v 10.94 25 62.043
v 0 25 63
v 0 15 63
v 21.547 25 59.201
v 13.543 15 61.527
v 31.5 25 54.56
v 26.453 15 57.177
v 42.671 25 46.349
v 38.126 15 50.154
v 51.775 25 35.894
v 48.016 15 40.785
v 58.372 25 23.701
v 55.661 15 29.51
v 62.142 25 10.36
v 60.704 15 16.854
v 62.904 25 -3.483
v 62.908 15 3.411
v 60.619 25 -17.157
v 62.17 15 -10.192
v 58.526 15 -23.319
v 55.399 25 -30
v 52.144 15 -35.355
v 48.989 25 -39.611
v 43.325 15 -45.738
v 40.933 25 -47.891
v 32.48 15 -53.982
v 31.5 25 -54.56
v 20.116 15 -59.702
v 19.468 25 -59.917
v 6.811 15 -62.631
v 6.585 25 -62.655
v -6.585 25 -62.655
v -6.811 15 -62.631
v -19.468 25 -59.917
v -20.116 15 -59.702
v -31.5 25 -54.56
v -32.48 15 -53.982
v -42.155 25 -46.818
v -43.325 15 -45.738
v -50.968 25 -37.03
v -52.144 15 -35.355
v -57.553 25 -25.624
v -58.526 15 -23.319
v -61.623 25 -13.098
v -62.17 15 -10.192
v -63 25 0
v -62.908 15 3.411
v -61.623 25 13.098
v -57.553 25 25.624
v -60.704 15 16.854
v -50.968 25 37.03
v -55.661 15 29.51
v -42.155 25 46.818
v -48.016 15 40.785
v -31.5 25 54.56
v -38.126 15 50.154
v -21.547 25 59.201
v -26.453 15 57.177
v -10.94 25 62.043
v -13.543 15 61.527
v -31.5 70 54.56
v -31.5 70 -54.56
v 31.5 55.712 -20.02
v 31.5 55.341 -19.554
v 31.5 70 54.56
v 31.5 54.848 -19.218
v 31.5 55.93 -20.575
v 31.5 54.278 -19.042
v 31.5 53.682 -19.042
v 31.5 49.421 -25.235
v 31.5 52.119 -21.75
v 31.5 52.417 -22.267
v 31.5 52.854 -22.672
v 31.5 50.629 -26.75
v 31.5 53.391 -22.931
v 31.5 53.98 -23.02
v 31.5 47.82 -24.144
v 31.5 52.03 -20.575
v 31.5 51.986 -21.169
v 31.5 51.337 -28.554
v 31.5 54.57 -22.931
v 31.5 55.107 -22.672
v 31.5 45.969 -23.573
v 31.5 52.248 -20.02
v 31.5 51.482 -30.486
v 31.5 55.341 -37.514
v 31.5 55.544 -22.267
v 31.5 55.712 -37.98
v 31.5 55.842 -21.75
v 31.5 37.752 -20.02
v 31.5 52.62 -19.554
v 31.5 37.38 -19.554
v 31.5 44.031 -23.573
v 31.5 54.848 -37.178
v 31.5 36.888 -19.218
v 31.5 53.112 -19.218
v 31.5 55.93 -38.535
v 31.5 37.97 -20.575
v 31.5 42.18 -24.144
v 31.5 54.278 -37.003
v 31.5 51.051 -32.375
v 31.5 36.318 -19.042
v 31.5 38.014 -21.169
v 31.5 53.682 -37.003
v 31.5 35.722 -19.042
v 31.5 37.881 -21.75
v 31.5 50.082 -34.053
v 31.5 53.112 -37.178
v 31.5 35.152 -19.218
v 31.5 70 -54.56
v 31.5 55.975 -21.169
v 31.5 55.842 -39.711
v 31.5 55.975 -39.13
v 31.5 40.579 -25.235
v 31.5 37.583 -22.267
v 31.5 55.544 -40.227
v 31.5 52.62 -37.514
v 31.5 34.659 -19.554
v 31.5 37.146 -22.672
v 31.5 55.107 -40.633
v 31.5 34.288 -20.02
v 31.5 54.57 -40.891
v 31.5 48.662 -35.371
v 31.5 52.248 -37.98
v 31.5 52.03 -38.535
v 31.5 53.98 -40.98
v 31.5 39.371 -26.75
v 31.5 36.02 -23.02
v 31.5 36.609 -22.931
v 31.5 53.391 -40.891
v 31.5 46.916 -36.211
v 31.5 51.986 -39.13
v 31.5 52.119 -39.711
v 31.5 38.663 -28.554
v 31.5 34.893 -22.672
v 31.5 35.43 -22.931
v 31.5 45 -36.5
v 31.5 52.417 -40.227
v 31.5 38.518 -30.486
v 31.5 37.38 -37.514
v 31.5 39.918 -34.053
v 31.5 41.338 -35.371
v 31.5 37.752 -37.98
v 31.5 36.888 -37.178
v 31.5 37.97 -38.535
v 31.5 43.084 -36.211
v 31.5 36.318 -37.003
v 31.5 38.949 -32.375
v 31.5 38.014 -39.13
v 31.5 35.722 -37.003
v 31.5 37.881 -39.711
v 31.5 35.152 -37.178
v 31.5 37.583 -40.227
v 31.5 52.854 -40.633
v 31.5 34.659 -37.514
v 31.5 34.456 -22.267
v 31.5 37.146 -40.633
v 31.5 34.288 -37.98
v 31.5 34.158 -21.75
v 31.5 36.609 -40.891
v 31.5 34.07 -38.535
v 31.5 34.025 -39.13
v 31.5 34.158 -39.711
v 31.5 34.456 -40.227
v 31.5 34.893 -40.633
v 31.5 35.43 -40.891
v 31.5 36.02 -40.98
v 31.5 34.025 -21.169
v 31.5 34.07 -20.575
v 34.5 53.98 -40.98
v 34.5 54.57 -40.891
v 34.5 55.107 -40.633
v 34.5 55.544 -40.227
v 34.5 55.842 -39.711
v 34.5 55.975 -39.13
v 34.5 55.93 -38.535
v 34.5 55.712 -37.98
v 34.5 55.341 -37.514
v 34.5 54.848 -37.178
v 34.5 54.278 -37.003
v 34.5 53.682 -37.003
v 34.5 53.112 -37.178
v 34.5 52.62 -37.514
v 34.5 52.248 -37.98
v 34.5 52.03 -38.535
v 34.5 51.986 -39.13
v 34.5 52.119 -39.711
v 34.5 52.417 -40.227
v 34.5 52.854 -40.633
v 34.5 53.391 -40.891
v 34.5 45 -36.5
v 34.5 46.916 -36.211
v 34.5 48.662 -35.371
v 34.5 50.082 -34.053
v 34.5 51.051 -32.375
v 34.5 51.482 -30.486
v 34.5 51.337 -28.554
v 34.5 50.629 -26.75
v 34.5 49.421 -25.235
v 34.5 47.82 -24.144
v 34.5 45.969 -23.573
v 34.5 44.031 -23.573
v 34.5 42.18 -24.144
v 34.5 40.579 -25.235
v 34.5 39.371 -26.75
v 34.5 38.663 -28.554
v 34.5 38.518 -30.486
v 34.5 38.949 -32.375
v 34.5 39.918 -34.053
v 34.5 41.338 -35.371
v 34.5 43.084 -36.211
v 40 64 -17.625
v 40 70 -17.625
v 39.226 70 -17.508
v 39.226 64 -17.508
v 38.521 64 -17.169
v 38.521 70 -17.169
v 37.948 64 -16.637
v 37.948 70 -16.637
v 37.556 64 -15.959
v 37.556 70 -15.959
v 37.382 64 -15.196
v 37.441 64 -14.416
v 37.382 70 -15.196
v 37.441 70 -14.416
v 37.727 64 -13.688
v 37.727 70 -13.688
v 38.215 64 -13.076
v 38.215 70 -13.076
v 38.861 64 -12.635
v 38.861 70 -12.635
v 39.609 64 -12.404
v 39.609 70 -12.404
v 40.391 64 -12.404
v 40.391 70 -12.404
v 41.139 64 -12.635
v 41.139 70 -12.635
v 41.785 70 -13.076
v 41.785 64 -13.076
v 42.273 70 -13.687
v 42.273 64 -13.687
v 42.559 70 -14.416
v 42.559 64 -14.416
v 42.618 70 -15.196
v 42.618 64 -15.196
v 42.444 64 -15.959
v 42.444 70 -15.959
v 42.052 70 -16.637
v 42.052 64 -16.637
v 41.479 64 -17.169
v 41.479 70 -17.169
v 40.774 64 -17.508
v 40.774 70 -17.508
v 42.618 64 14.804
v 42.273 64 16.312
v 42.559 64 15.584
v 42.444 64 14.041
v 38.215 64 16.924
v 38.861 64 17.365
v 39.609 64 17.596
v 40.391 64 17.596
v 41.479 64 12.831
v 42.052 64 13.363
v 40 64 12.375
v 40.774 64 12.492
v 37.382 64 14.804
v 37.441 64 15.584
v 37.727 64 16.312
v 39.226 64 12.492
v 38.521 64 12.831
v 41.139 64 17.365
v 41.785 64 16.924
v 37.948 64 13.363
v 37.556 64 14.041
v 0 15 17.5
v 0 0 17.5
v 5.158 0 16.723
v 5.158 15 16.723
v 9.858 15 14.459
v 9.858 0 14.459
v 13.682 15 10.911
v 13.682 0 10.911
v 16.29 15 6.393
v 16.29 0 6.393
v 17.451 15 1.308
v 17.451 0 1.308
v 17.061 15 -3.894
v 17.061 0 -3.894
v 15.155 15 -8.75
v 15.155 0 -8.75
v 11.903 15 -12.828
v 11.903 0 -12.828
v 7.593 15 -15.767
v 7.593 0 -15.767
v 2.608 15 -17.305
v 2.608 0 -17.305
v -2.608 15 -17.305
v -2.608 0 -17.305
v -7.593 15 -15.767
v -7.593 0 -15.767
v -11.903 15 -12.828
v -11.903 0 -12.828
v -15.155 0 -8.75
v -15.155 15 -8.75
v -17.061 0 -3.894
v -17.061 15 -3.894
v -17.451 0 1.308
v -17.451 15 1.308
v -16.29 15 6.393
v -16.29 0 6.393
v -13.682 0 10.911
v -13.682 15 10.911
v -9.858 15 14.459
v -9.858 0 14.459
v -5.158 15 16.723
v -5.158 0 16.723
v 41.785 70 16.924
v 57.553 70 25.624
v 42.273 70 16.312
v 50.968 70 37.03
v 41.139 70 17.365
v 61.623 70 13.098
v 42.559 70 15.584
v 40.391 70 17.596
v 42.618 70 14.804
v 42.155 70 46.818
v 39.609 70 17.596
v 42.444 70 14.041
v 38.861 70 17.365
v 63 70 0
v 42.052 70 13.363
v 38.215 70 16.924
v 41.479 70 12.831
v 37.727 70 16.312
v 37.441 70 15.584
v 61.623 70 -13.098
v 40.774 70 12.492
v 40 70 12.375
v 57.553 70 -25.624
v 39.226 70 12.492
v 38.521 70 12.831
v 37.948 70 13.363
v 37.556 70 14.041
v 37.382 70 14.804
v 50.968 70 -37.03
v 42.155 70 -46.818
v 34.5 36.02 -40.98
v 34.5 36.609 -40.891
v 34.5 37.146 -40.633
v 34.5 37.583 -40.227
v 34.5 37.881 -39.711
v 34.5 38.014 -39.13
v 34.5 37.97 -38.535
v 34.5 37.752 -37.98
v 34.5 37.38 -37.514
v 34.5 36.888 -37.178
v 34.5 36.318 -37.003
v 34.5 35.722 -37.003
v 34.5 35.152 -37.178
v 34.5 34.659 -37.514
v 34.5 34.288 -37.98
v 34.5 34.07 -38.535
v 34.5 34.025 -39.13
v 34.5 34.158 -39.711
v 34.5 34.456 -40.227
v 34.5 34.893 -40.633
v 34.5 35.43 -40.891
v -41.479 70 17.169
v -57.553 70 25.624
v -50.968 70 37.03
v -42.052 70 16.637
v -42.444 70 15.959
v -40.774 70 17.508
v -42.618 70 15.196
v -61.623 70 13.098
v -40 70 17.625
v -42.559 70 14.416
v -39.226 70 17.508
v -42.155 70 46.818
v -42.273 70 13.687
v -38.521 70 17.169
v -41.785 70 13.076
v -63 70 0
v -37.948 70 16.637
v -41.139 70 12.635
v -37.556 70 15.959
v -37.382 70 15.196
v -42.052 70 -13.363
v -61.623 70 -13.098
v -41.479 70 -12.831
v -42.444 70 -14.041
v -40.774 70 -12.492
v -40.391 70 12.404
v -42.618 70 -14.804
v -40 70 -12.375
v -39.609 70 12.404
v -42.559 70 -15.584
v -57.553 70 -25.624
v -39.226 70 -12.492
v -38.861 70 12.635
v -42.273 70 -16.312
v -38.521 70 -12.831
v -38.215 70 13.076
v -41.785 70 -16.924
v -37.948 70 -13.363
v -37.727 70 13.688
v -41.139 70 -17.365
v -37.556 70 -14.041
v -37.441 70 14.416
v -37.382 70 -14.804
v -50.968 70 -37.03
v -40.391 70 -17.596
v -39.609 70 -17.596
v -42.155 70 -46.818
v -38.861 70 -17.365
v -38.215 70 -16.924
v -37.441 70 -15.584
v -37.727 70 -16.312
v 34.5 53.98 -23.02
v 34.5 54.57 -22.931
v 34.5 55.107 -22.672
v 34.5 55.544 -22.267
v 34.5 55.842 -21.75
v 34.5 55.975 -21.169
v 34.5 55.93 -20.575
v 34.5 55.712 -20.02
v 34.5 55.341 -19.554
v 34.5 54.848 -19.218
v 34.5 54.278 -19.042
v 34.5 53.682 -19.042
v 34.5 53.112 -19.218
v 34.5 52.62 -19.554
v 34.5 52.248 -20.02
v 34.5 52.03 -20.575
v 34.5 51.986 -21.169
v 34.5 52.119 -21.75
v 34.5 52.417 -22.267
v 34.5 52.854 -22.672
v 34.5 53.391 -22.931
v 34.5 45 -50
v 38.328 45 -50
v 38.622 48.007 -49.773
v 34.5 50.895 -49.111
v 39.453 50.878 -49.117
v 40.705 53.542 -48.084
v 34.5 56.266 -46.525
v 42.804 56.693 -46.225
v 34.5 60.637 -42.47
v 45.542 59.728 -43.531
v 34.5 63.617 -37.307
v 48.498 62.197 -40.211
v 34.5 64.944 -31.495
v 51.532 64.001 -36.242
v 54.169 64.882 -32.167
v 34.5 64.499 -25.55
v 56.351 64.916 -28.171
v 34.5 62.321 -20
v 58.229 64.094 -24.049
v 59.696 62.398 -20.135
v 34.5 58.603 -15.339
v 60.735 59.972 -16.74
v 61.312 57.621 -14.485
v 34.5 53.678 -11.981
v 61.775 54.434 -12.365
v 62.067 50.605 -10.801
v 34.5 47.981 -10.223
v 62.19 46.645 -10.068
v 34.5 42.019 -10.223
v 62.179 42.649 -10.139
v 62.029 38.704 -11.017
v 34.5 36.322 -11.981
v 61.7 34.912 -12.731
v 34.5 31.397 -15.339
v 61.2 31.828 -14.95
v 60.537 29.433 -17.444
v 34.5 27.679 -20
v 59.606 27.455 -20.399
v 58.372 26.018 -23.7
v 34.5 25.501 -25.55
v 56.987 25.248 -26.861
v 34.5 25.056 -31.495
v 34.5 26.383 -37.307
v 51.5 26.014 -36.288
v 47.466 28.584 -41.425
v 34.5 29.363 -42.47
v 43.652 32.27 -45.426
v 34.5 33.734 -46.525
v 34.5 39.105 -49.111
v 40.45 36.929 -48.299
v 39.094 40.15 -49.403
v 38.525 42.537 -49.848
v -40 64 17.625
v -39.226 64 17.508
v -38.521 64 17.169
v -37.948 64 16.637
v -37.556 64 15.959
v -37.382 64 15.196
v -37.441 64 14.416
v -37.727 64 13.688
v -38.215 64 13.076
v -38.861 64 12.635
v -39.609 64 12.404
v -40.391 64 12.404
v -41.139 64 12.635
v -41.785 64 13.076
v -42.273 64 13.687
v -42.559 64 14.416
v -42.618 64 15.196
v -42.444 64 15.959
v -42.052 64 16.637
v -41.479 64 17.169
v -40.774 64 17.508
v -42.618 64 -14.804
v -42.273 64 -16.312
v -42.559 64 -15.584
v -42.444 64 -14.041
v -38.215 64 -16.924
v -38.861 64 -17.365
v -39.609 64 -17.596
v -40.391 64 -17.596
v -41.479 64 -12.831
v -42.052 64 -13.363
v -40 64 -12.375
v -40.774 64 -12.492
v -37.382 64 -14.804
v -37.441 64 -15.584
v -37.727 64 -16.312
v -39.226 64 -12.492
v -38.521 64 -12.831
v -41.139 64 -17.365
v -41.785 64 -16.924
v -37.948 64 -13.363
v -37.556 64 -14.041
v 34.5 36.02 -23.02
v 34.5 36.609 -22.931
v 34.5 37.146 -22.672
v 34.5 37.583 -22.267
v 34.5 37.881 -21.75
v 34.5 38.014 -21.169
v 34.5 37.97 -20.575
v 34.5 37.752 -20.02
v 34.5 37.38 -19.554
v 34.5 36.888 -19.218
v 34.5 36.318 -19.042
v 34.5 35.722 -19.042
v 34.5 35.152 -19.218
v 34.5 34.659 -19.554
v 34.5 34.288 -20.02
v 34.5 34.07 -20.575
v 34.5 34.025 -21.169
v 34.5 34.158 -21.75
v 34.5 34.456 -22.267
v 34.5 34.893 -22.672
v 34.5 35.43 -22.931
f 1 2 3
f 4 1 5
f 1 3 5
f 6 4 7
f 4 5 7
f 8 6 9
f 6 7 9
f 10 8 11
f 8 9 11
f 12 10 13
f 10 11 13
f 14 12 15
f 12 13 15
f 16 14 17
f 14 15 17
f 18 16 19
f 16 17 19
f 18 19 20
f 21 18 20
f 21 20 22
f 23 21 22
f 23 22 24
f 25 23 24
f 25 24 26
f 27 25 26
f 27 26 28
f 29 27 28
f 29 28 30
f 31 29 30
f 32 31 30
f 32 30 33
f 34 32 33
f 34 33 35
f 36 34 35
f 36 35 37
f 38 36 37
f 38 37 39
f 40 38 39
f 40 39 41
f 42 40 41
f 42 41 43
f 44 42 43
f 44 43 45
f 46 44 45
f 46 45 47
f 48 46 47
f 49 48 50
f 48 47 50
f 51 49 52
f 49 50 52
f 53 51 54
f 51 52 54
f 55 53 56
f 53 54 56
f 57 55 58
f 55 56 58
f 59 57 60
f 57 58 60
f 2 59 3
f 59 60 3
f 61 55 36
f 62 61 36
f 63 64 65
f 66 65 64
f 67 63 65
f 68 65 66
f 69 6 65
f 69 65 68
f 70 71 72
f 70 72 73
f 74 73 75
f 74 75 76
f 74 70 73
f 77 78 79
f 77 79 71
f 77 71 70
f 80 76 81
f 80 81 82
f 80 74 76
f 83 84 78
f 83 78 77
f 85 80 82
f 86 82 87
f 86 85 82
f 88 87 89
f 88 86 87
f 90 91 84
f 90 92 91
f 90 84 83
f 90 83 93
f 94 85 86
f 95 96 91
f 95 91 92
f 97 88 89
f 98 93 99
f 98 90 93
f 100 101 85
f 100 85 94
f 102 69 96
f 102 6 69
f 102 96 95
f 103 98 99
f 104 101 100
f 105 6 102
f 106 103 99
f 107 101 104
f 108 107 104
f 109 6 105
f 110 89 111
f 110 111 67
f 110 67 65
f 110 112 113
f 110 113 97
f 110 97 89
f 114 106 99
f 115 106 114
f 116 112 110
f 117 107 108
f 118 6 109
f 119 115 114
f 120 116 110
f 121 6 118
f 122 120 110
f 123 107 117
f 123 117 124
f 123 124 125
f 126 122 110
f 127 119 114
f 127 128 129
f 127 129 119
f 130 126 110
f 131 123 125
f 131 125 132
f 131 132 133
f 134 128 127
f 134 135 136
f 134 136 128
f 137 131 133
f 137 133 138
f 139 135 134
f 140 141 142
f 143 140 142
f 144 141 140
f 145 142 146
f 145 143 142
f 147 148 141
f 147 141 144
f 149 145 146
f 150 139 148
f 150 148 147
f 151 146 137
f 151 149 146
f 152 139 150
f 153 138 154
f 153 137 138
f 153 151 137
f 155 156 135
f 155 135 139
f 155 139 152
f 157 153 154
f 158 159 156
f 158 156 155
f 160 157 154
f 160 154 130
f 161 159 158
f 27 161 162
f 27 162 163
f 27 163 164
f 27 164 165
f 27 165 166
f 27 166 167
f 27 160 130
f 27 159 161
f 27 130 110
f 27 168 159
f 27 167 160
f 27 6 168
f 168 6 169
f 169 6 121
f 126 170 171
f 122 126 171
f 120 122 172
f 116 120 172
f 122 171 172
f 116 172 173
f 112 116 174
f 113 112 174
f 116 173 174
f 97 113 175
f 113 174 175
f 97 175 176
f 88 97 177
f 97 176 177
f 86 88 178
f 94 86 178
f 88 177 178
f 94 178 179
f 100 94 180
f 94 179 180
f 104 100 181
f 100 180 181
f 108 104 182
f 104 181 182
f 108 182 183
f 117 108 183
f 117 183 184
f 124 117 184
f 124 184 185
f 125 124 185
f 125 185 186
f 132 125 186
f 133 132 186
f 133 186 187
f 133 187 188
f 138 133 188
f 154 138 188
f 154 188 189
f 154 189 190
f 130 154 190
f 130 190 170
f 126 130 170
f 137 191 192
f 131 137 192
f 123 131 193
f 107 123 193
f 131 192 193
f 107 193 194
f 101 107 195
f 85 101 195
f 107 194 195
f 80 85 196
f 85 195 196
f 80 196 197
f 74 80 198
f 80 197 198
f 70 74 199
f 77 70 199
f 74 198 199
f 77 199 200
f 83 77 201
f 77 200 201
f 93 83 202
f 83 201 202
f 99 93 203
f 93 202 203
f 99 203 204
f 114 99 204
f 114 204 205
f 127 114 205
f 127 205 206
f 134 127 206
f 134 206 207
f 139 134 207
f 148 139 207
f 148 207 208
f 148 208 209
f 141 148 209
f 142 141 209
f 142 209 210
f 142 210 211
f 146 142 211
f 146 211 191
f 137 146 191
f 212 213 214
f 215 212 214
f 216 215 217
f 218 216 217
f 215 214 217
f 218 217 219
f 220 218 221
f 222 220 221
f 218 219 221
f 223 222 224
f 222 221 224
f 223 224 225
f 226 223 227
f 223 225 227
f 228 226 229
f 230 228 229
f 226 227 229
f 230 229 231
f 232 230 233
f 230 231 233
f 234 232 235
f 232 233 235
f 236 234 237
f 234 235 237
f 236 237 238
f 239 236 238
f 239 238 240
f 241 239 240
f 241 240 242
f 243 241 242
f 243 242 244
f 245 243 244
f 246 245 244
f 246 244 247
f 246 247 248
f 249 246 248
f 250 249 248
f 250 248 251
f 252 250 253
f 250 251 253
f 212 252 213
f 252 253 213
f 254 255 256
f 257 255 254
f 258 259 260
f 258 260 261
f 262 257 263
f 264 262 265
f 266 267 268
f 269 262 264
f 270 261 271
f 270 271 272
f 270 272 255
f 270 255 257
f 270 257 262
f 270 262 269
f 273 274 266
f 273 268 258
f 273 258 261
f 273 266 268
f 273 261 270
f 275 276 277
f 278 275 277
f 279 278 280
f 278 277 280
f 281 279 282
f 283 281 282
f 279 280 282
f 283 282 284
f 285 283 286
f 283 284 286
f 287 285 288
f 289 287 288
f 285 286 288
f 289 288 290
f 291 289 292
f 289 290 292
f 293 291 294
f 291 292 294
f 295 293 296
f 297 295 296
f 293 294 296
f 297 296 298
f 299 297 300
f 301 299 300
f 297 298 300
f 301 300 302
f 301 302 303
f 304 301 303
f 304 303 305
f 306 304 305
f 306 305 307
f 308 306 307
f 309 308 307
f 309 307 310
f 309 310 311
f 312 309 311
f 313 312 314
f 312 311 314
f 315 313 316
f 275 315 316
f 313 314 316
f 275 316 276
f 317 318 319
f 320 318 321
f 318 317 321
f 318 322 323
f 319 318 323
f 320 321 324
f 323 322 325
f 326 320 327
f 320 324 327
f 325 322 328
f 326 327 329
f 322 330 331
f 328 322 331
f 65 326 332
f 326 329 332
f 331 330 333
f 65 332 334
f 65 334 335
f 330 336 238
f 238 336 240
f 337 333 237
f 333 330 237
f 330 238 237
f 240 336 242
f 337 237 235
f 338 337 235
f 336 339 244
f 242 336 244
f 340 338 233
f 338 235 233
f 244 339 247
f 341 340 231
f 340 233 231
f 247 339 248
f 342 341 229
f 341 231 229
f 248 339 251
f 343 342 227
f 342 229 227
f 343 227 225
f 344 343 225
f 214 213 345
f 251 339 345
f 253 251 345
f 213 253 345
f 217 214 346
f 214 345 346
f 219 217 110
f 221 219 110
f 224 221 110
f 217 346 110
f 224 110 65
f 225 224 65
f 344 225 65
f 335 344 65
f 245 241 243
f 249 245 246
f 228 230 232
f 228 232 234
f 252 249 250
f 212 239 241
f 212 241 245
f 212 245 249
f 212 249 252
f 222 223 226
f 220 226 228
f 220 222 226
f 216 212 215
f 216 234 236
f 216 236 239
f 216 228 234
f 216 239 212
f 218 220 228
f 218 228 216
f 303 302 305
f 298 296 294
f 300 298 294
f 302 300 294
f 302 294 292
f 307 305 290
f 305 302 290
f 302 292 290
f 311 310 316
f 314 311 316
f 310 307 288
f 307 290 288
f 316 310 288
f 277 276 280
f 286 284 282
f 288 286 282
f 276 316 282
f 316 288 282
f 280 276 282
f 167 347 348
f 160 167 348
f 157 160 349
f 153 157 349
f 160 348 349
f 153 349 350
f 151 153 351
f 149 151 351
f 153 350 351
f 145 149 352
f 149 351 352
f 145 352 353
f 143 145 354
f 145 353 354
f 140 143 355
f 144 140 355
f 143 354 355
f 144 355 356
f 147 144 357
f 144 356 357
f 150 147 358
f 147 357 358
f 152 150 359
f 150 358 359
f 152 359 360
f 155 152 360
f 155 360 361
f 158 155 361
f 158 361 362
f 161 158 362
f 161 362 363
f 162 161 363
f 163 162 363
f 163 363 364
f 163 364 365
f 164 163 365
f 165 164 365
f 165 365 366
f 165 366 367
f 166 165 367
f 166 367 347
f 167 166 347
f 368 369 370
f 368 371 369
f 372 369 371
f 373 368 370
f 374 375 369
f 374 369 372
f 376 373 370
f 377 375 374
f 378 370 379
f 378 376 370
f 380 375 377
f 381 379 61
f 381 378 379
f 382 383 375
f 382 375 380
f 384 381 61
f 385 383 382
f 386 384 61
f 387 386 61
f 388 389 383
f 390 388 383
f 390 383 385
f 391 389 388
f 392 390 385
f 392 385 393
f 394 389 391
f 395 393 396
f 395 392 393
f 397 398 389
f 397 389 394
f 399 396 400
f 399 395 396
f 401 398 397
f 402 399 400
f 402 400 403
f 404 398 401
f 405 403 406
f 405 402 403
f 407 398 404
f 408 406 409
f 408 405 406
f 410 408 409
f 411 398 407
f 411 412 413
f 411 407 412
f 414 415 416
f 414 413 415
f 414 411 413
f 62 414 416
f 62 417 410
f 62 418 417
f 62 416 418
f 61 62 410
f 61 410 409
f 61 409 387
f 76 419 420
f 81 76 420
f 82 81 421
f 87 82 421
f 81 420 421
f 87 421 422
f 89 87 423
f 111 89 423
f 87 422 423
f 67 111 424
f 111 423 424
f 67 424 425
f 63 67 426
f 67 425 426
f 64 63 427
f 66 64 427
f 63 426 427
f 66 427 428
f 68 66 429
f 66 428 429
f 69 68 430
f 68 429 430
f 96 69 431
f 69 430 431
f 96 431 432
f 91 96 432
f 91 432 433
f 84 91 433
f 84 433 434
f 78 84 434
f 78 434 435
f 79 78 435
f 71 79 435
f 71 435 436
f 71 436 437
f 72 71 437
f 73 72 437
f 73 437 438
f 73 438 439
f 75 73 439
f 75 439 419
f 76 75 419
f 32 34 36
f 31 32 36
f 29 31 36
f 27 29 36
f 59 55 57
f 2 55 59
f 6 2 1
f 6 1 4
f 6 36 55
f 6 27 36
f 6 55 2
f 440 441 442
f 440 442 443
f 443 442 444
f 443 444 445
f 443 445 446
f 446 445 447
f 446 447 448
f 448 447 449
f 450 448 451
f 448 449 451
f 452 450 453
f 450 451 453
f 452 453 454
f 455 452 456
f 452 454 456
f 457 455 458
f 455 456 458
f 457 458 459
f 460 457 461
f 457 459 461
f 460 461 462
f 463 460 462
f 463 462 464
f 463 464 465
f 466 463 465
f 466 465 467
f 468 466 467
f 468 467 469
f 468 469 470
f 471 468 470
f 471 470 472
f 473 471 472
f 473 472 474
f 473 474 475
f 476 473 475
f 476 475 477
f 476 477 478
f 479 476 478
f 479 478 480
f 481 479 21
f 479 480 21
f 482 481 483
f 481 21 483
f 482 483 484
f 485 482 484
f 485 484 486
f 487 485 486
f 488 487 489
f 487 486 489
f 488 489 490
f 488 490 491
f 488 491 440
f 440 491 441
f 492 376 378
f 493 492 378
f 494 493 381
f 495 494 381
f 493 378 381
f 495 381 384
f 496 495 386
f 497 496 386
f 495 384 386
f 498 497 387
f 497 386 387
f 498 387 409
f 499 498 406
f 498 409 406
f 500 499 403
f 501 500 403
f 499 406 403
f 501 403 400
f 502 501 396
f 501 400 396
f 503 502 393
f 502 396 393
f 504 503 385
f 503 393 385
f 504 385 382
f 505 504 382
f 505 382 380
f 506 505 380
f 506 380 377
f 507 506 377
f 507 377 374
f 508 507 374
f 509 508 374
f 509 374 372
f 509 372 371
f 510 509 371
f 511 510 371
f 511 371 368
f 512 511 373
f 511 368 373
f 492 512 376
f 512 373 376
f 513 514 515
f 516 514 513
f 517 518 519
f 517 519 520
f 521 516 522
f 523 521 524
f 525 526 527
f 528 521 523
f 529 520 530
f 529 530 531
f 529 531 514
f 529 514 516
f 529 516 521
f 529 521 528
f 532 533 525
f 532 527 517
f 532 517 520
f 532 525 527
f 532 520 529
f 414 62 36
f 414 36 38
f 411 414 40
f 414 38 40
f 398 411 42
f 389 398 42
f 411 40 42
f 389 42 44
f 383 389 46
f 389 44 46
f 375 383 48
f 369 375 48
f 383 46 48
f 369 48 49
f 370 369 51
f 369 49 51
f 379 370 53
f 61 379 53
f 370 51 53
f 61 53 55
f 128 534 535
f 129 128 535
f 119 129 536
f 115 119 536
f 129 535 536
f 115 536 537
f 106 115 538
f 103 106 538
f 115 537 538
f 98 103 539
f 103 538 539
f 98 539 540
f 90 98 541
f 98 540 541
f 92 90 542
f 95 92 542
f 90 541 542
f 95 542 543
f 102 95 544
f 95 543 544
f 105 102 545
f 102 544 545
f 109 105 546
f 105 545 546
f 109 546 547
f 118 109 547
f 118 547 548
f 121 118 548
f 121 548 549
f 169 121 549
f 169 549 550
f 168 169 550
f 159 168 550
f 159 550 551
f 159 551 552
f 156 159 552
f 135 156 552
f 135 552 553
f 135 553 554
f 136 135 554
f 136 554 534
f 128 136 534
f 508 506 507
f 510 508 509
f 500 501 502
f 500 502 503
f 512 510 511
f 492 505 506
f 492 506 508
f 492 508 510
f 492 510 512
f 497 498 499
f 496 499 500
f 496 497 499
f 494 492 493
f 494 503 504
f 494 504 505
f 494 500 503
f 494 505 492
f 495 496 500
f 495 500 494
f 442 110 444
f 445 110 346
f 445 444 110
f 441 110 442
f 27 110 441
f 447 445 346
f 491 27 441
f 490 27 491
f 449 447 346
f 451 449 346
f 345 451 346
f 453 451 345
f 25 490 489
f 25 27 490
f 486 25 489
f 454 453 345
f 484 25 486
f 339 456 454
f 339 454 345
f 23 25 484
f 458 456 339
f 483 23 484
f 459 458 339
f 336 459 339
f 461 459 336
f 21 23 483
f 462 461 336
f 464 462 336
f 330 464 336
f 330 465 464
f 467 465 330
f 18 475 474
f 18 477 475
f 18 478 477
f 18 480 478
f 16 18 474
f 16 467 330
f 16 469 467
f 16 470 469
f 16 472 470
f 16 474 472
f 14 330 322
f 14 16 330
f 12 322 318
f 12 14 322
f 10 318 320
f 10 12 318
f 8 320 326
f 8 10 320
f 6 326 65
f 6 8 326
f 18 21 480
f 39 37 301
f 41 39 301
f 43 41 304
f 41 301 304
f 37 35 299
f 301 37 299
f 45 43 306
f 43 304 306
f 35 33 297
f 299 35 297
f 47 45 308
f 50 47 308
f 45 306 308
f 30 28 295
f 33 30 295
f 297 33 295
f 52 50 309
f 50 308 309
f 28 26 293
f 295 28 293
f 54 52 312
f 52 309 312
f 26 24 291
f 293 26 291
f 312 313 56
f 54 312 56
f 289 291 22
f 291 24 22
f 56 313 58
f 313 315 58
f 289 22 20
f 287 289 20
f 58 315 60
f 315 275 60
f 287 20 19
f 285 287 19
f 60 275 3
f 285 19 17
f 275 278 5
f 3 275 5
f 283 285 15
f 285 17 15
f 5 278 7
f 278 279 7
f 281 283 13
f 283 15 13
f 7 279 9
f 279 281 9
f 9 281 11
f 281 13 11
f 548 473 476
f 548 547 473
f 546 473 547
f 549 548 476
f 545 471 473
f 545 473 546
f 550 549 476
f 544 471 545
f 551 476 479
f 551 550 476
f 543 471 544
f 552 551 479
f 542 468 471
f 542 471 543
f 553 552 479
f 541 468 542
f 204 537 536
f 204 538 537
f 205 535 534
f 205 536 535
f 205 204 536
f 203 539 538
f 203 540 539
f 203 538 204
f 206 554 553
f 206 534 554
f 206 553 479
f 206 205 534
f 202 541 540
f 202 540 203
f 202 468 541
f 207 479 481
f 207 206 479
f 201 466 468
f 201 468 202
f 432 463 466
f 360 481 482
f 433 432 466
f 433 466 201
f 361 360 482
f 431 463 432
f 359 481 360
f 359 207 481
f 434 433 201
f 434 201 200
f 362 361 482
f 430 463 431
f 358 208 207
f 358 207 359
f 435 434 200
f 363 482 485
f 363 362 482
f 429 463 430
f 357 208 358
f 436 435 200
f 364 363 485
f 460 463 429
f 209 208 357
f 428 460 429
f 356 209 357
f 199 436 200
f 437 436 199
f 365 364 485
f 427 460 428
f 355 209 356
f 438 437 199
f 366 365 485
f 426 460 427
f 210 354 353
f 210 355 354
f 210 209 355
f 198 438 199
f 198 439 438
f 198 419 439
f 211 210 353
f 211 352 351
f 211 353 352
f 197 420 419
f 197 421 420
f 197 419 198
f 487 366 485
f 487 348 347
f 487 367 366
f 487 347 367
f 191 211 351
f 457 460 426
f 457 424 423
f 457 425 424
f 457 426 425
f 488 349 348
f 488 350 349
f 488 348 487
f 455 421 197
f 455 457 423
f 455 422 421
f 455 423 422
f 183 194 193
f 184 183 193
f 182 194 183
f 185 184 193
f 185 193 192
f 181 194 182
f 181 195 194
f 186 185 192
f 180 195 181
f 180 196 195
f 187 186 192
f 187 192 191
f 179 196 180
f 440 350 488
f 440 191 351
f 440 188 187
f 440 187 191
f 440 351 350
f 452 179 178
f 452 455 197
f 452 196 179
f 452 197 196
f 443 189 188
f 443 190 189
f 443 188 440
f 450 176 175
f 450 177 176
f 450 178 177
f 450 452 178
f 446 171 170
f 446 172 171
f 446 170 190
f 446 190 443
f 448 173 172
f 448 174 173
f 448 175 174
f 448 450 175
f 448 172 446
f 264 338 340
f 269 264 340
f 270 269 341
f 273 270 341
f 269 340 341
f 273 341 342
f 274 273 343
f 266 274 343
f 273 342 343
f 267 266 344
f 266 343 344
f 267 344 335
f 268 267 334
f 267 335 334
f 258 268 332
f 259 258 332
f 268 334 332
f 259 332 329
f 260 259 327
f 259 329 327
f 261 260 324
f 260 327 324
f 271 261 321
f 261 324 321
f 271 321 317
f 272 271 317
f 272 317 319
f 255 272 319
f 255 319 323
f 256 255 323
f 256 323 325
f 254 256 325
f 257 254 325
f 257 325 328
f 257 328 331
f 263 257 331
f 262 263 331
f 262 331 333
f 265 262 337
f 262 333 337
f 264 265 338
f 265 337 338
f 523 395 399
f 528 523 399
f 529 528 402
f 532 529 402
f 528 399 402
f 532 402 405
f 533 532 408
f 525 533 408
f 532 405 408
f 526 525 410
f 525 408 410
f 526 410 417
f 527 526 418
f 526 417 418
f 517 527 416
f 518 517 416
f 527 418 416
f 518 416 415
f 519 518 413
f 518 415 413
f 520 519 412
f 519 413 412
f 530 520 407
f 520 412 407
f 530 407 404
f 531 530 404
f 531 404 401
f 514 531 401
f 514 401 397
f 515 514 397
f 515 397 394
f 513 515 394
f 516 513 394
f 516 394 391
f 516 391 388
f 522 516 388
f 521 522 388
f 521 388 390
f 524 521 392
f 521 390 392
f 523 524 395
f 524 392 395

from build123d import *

# Parameters (mm, degrees)
SKETCH1_R           = 17.5
BOSS_EXTRUDE1_DEPTH = 15
SKETCH2_R           = 63
BOSS_EXTRUDE2_DEPTH = 10
BOSS_EXTRUDE3_DEPTH = 45
SKETCH5_R           = 2.625
CUT_EXTRUDE1_DEPTH  = 6
SKETCH7_R           = 20
CUT_EXTRUDE2_DEPTH  = 28.5
SKETCH9_R           = 2
SKETCH9_R_2         = 6.5
CUT_EXTRUDE3_DEPTH  = 31.5


with BuildPart() as part:
    # Sketch1 → Boss-Extrude1 (new body)
    with BuildSketch(Plane(origin=(0, 0, 0), x_dir=(1, 0, 0), z_dir=(0, 1, 0))):
        with Locations(Location((0, 0, 0), (0, 0, 270))):
            Circle(SKETCH1_R)
    extrude(amount=BOSS_EXTRUDE1_DEPTH)

    # Sketch2 → Boss-Extrude2 (add)
    with BuildSketch(Plane(origin=(0, 15, 0), x_dir=(1, 0, 0), z_dir=(0, 1, 0))):
        with Locations(Location((0, 0, 0), (0, 0, 270))):
            Circle(SKETCH2_R)
    extrude(amount=BOSS_EXTRUDE2_DEPTH)

    # Sketch4 → Boss-Extrude3 (add)
    with BuildSketch(Plane(origin=(0, 25, 0), x_dir=(1, 0, 0), z_dir=(0, 1, 0))):
        with BuildLine():
            Line((-31.5, 44), (-31.5, 54.559600438))
            ThreePointArc((-31.5, 54.559600438), (-63, 0), (-31.5, -54.559600438))
            Line((-31.5, -54.559600438), (-31.5, -44))
            Line((-31.5, -44), (-31.5, 44))
        make_face()
        with BuildLine():
            Line((31.5, -44), (31.5, 44))
            Line((31.5, 44), (31.5, 54.559600438))
            ThreePointArc((31.5, 54.559600438), (63, 0), (31.5, -54.559600438))
            Line((31.5, -54.559600438), (31.5, -44))
        make_face()
    extrude(amount=BOSS_EXTRUDE3_DEPTH)

    # Sketch5 → Cut-Extrude1 (cut)
    with BuildSketch(Plane(origin=(0, 70, 0), x_dir=(1, 0, 0), z_dir=(0, 1, 0))):
        with Locations(Location((-40, 15, 0), (0, 0, 270))):
            Circle(SKETCH5_R)
        with Locations(Location((-40, -15, 0), (0, 0, 270))):
            Circle(SKETCH5_R)
        with Locations(Location((40, -15, 0), (0, 0, 90))):
            Circle(SKETCH5_R)
        with Locations(Location((40, 15, 0), (0, 0, 90))):
            Circle(SKETCH5_R)
    extrude(amount=-CUT_EXTRUDE1_DEPTH, mode=Mode.SUBTRACT)

    # Sketch7 → Cut-Extrude2 (cut)
    with BuildSketch(Plane(origin=(63, 0, 0), x_dir=(0, 0, -1), z_dir=(1, 0, 0))):
        with Locations((30, 45)):
            Circle(SKETCH7_R)
    extrude(amount=-CUT_EXTRUDE2_DEPTH, mode=Mode.SUBTRACT)

    # Sketch9 → Cut-Extrude3 (cut)
    with BuildSketch(Plane(origin=(63, 0, 0), x_dir=(0, 0, -1), z_dir=(1, 0, 0))):
        with Locations((21.019743879, 36.019743879)):
            Circle(SKETCH9_R)
        with Locations((21.019743879, 53.980256121)):
            Circle(SKETCH9_R)
        with Locations((38.980256121, 53.980256121)):
            Circle(SKETCH9_R)
        with Locations((38.980256121, 36.019743879)):
            Circle(SKETCH9_R)
        with Locations((30, 45)):
            Circle(SKETCH9_R_2)
    extrude(amount=-CUT_EXTRUDE3_DEPTH, mode=Mode.SUBTRACT)


solid = part.part
